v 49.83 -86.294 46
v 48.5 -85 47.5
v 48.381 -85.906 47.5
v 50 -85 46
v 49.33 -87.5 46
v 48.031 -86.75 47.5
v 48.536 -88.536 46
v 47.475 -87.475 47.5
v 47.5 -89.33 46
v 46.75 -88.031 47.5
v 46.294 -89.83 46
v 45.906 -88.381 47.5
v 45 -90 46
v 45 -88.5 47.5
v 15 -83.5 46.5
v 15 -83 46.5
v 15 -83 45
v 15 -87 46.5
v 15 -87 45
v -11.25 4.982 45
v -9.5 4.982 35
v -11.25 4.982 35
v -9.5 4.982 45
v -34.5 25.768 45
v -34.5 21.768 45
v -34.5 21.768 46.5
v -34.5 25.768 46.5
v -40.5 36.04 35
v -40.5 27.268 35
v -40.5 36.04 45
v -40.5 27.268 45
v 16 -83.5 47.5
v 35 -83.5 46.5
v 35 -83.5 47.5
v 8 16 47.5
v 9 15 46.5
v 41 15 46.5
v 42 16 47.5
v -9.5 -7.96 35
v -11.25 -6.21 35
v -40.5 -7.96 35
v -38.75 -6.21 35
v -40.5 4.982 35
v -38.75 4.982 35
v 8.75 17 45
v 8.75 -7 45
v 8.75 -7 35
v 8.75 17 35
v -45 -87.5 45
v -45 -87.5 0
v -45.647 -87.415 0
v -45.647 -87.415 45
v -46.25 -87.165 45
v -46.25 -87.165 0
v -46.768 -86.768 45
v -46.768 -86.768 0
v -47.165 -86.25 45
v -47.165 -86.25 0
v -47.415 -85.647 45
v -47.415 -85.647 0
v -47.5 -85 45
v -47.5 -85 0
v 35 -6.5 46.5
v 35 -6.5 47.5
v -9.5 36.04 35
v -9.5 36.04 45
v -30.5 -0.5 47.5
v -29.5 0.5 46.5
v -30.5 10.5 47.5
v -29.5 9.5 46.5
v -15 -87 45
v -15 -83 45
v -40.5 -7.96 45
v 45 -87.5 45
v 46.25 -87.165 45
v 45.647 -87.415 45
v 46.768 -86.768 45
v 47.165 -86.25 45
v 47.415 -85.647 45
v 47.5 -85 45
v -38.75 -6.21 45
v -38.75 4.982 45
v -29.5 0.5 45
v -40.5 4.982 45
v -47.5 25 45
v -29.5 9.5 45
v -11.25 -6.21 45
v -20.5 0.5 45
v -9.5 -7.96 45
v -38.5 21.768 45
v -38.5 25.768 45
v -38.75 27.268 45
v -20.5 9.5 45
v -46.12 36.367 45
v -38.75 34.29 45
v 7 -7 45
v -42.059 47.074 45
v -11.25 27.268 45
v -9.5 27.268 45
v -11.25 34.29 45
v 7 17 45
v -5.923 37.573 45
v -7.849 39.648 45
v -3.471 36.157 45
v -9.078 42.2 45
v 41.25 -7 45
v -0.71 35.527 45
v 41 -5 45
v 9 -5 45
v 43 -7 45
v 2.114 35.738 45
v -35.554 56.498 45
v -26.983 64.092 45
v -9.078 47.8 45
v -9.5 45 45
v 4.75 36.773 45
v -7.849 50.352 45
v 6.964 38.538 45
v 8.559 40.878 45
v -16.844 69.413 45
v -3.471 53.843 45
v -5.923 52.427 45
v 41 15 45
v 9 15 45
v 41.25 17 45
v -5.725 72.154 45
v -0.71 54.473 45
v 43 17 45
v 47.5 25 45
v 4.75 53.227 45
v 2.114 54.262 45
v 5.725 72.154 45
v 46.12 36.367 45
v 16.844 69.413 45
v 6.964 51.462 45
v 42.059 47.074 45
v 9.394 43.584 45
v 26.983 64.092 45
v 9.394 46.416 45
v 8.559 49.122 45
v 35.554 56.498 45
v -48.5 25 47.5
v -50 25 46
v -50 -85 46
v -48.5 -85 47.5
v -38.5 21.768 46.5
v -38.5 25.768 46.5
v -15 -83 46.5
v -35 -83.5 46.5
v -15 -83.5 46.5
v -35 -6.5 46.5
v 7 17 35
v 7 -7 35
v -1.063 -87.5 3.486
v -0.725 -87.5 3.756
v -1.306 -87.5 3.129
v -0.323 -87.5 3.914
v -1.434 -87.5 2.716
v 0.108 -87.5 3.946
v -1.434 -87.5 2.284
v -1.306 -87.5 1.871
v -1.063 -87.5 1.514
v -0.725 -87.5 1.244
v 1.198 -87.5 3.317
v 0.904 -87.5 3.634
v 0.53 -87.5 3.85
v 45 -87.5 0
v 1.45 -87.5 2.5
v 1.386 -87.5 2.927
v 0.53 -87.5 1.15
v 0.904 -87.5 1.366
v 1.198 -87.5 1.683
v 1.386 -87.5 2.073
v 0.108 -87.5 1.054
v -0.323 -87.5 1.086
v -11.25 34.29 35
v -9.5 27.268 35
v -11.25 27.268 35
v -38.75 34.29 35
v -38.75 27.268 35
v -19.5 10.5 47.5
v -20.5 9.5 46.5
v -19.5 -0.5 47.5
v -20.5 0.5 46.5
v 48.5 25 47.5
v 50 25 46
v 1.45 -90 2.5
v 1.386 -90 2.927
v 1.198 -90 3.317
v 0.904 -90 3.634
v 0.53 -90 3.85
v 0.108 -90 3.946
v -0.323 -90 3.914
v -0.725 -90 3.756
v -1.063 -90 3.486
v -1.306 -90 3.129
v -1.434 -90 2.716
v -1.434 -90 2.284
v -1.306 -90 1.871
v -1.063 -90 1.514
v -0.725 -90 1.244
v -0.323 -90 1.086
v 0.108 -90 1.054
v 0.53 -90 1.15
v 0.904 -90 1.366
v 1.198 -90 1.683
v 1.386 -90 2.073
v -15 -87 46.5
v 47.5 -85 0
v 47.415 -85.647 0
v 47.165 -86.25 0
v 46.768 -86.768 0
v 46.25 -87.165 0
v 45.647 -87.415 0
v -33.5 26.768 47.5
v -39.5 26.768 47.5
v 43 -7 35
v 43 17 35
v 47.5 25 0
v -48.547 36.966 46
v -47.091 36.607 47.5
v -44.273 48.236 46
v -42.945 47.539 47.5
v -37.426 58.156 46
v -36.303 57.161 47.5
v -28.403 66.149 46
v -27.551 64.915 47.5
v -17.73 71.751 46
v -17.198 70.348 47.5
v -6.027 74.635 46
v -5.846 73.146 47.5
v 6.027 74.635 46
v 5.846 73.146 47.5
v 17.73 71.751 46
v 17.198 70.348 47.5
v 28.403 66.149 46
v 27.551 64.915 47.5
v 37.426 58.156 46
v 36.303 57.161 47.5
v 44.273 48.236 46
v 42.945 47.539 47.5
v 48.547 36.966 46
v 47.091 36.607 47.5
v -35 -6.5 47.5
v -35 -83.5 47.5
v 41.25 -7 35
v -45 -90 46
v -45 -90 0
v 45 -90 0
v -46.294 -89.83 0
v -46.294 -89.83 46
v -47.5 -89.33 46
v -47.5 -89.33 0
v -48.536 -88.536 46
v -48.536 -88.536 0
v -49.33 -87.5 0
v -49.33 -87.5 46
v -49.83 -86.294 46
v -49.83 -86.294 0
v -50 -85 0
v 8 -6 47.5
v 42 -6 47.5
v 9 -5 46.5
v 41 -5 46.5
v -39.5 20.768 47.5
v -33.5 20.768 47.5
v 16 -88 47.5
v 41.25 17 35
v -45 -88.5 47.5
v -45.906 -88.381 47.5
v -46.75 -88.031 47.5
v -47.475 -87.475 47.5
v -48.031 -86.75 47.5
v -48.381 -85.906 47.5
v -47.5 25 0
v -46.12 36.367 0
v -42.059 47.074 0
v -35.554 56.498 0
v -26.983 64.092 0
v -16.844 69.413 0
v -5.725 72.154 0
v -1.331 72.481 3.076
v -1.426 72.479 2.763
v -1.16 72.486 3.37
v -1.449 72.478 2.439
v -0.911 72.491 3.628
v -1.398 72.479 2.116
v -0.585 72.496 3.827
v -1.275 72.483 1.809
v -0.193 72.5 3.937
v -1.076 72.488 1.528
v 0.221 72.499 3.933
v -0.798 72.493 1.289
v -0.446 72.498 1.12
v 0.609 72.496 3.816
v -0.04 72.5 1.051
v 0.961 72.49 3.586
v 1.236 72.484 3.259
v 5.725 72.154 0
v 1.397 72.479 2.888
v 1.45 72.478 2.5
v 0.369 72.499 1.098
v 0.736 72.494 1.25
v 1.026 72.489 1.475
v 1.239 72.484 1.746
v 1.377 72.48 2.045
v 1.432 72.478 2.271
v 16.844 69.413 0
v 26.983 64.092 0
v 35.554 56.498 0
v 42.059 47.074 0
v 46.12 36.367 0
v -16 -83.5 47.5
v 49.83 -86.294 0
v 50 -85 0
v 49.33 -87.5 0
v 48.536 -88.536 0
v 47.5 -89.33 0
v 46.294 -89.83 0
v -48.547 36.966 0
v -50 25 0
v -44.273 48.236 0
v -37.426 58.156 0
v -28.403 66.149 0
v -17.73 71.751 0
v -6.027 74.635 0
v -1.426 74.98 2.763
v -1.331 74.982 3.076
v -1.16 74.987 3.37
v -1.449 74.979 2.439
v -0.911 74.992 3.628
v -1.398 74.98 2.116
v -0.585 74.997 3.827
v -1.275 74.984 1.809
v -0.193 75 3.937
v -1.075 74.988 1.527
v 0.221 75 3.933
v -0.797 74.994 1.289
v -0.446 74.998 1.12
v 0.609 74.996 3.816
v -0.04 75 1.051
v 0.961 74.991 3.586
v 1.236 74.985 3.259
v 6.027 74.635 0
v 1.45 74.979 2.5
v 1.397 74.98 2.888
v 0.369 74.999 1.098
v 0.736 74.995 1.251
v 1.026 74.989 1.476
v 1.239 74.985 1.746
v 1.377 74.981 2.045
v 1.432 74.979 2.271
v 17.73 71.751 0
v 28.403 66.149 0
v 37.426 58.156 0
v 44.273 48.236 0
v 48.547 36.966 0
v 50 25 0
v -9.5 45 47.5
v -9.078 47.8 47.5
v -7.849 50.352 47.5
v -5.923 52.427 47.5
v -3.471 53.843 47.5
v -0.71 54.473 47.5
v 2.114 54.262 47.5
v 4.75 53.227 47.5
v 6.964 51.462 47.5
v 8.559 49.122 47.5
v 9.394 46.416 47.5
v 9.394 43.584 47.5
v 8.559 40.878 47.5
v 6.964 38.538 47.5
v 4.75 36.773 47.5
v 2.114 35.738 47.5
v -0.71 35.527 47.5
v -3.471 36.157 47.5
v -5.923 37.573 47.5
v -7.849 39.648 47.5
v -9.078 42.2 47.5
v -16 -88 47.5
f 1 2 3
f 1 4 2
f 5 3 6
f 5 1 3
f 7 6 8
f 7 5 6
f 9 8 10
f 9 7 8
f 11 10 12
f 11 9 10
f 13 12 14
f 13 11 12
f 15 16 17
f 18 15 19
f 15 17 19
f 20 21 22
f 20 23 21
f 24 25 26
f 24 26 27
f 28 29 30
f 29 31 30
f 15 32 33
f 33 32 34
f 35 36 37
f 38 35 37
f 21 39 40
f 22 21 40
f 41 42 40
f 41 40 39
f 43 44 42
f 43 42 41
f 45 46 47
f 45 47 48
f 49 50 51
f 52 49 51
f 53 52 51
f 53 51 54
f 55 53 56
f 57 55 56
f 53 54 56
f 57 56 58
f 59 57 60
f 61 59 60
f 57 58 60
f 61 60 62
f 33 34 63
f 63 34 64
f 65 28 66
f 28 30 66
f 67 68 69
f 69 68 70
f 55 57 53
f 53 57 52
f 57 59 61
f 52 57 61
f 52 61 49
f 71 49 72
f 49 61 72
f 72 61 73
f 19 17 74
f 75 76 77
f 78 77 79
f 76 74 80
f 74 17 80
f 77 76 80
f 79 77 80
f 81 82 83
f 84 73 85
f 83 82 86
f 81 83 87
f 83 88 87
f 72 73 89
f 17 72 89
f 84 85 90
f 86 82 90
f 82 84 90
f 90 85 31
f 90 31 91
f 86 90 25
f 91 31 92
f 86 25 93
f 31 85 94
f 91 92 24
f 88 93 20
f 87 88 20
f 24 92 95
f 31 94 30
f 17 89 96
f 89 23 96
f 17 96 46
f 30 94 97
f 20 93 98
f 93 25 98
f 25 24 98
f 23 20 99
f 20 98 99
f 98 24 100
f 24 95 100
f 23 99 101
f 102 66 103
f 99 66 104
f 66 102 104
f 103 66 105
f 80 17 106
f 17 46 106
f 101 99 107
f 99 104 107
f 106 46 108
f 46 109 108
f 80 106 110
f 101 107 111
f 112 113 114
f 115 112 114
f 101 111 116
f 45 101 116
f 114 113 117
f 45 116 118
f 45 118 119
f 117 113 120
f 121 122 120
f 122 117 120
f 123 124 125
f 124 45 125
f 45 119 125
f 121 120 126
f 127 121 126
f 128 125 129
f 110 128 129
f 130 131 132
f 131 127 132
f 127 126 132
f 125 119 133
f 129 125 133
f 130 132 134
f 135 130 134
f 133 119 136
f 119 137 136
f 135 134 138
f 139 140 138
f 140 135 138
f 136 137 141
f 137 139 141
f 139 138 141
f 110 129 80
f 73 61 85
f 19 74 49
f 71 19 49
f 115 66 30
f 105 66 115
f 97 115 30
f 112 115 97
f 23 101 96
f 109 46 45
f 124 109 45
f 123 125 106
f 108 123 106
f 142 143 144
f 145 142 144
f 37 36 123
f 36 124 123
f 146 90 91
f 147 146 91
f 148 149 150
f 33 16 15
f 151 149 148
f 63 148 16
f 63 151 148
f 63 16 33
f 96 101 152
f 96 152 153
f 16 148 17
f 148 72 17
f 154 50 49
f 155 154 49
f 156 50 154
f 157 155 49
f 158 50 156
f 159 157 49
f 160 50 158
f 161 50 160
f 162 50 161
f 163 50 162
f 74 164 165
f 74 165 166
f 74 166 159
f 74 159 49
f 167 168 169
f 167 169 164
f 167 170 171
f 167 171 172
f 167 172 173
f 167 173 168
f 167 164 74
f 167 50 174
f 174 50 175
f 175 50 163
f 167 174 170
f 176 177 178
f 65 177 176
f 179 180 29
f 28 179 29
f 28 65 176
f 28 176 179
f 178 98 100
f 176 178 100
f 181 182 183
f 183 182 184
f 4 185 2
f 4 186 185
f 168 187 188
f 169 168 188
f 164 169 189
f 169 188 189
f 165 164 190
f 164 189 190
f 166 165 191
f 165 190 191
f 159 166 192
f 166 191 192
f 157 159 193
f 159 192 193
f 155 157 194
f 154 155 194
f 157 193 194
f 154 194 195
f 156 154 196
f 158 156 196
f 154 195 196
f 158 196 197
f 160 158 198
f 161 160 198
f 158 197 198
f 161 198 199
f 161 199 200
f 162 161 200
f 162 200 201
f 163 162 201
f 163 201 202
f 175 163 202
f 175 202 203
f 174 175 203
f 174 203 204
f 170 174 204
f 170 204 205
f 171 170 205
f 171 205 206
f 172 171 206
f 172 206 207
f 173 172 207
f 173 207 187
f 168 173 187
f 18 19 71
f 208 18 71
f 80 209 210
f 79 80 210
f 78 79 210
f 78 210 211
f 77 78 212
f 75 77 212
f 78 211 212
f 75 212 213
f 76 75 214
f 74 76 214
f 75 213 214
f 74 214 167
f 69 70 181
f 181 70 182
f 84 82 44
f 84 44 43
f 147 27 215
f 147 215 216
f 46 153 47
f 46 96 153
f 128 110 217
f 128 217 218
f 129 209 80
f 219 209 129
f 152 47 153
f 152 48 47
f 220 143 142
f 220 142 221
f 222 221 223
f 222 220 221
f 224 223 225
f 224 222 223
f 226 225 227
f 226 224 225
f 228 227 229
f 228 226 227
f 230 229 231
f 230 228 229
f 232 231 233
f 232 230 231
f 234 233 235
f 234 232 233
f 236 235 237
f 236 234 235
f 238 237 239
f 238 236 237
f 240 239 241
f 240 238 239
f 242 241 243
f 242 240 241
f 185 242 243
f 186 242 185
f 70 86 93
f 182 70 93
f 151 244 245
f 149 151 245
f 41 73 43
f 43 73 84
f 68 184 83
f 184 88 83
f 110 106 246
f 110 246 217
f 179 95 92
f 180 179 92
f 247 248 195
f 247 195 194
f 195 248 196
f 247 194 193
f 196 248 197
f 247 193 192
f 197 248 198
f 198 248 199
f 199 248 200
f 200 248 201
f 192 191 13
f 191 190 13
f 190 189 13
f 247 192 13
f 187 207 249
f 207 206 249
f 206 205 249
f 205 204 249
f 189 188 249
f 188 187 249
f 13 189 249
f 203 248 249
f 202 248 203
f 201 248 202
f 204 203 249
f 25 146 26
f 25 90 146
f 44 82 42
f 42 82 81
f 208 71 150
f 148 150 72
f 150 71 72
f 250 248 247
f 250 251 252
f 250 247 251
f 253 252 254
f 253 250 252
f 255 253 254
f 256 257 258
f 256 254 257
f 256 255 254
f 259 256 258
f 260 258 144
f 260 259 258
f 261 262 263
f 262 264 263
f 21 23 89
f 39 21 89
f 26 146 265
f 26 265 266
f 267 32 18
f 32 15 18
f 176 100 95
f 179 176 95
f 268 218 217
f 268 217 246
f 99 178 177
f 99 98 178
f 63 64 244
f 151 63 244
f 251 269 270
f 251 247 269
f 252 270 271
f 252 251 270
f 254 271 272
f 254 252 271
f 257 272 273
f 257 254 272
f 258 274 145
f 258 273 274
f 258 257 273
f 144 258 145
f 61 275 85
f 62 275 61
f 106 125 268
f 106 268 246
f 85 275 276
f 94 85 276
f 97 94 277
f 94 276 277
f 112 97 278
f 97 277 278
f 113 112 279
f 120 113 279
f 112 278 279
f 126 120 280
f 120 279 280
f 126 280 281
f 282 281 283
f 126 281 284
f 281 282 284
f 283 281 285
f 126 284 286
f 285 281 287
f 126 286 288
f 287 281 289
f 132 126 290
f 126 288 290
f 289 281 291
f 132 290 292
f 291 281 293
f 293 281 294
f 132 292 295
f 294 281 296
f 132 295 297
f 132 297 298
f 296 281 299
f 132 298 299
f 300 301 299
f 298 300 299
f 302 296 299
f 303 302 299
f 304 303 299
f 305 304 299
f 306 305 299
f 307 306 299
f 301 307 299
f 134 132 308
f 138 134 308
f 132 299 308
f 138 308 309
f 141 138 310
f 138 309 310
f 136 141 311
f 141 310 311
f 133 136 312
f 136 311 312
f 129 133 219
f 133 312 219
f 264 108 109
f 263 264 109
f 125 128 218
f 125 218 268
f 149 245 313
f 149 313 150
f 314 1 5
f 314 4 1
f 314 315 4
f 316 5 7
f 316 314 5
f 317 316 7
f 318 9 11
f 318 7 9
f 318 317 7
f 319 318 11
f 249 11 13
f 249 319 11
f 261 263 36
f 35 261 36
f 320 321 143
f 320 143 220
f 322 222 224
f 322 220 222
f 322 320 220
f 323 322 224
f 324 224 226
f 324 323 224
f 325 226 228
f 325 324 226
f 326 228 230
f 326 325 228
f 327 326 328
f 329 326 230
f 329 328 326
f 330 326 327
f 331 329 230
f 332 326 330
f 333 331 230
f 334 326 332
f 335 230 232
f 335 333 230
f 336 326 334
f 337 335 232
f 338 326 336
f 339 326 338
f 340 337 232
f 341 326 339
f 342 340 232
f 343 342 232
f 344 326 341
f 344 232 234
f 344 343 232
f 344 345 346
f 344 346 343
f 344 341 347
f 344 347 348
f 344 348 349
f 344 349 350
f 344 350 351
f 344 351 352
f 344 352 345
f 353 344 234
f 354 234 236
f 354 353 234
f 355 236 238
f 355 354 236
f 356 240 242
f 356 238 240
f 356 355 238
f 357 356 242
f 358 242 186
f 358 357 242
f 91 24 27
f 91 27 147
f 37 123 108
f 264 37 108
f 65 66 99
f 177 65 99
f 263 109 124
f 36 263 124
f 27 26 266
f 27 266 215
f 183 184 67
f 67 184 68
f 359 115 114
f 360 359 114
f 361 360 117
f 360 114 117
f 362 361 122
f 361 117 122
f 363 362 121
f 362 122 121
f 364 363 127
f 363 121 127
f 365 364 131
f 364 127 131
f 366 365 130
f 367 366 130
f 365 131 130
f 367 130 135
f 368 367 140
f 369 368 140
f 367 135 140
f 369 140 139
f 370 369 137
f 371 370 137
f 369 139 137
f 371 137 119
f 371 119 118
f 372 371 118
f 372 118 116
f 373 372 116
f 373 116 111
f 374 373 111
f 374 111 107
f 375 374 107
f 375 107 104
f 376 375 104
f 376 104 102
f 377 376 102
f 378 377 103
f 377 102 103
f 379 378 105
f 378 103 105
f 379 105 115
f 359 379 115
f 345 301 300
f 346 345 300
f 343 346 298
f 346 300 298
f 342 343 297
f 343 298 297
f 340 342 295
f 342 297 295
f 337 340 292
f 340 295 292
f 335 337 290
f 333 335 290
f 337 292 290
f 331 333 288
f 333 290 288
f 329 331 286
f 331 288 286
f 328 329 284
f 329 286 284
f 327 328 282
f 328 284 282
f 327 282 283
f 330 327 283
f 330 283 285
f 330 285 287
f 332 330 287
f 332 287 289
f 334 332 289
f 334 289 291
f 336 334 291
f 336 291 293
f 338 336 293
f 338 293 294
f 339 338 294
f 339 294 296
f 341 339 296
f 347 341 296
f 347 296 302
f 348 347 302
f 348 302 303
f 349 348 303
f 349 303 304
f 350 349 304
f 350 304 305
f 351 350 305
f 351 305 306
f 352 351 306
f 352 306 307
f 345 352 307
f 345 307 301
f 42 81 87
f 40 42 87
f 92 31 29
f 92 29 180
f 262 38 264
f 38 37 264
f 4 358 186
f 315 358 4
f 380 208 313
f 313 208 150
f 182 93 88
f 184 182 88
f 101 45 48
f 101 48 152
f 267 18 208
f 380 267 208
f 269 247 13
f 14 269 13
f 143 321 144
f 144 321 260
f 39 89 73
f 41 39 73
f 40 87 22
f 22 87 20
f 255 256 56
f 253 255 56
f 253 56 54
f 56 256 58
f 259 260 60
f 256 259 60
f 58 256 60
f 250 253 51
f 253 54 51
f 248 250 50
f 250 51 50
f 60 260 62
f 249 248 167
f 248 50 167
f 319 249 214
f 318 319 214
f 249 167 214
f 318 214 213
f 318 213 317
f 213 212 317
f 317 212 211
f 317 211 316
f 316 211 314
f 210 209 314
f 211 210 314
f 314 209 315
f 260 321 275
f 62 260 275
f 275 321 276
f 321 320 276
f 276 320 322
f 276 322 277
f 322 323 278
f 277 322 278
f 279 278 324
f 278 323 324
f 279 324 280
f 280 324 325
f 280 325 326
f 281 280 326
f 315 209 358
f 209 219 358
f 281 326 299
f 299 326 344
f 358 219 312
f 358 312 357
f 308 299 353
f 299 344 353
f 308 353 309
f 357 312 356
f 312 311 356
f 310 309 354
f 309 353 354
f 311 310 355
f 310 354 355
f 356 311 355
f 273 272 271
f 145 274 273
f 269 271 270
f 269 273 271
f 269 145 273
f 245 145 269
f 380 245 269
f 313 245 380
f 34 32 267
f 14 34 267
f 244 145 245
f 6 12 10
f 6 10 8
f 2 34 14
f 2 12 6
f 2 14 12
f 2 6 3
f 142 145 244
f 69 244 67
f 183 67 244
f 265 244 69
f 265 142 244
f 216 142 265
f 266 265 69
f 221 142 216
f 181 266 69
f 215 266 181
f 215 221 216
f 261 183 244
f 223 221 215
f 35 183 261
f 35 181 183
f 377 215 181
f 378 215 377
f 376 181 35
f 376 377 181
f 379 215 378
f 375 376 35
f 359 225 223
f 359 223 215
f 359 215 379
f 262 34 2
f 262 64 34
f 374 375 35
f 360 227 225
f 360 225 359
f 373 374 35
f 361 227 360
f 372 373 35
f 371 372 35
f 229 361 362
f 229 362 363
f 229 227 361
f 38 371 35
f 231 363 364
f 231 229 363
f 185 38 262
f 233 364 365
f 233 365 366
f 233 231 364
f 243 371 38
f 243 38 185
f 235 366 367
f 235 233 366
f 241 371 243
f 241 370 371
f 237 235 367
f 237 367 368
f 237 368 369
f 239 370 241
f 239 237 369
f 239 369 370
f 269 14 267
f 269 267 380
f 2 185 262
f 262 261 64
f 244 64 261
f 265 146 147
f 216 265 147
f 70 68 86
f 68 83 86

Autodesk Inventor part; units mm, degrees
ref_plane "YZ Plane" through (0, 0, 0) normal (1, 0, 0) x (0, 1, 0)
ref_plane "XZ Plane" through (0, 0, 0) normal (0, 1, 0) x (-1, 0, 0)
ref_plane "XY Plane" through (0, 0, 0) normal (0, 0, 1) x (1, 0, 0)
sketch "Sketch1" plane through (0, 0, 0) normal (0, 0, 1) x (1, 0, 0)
  line L0 (50, -70) -> (50, 25)
  line L1 (-50, 25) -> (-50, -70)
  line L2 (0, 0) -> (-38.1854, 57.2781) construction
  arc A0 (50, 25) -> (-50, 25) centre (0, 25) ccw
  line L3 (-45, -90) -> (45, -90)
  line L4 (0, 0) -> (38.1854, 57.2781) construction
  line L5 (50, -70) -> (50, -85)
  line L6 (-50, -70) -> (-50, -85)
  arc A1 (45, -90) -> (50, -85) centre (45, -85) ccw
  arc A2 (-50, -85) -> (-45, -90) centre (-45, -85) ccw
  dimension "d19" = 5
extrude "Extrusion1" add sketch "Sketch1" along normal blind 47.5
shell "Shell1" thickness 2.5 removed faces 1 at (-16.6667, -6.6667, 0)
sketch "Sketch2" plane through (0, 25, 45) normal (0, 0, -1) x (-1, 0, 0)
  arc A0 (50, 0) -> (-50, 0) centre (0, 0) ccw projected
  line L0 (25, 0) -> (50, 0) construction
  line L1 (25, 0) -> (50, 0) construction
  line L2 (-25, 0) -> (-50, 0)
  line L3 (-47.5, -110) -> (-47.5, 0) projected
  line L4 (25, 0) -> (50, 0) construction
  line L5 (25, 0) -> (50, 0) construction
  line L6 (47.5, 0) -> (47.5, -112.5)
  line L7 (47.5, -112.5) -> (-47.5, -112.5)
  line L8 (-47.5, -112.5) -> (-47.5, 0)
  line L9 (20.5, -24.5) -> (29.5, -24.5)
  line L10 (29.5, -24.5) -> (29.5, -15.5)
  line L11 (29.5, -15.5) -> (20.5, -15.5)
  line L12 (20.5, -15.5) -> (20.5, -24.5)
  circle A1 centre (25, -20) radius 0.7
  line L13 (20.5, -24.5) -> (29.5, -15.5) construction
  line L14 (29.5, -24.5) -> (20.5, -15.5) construction
  circle A2 centre (36.5, -1.2321) radius 0.9
  line L15 (34.5, 0.7679) -> (38.5, 0.7679)
  line L16 (38.5, -3.2321) -> (34.5, -3.2321)
  line L17 (34.5, 0.7679) -> (38.5, -3.2321) construction
  line L18 (38.5, 0.7679) -> (34.5, -3.2321) construction
  line L19 (34.5, -3.2321) -> (34.5, 0.7679)
  line L20 (29.5, -15.5) -> (29.5, -24.5)
  circle A3 centre (25, -20) radius 0.7
  line L21 (20.5, -15.5) -> (29.5, -15.5)
  line L22 (29.5, -24.5) -> (20.5, -24.5)
  line L23 (20.5, -24.5) -> (20.5, -15.5)
  line L24 (20.5, -15.5) -> (29.5, -24.5) construction
  line L25 (29.5, -15.5) -> (20.5, -24.5) construction
  line L26 (11.5, -30.9599) -> (38.5, -30.9599)
  line L27 (38.5, 9.0401) -> (11.5, 9.0401)
  line L28 (11.5, 9.0401) -> (11.5, -30.9599)
  line L29 (38.5, -30.9599) -> (38.5, 9.0401)
  line L30 (38.5, 0.7679) -> (38.5, -3.2321)
  line L31 (25, -20) -> (25, 0)
  line L32 (-25, 0) -> (-25, -20)
  line L33 (-25, 0) -> (-5, 0) construction
  line L34 (-41, -30) -> (-9, -30)
  line L35 (-9, -30) -> (-9, -10)
  line L36 (-9, -10) -> (-41, -10)
  line L37 (-41, -10) -> (-41, -30)
  line L38 (-41, -30) -> (-9, -10) construction
  line L39 (-9, -30) -> (-41, -10) construction
  line L40 (0, 0) -> (0, 20)
  circle A4 centre (0, 20) radius 9.5
  line L41 (33.5, -108) -> (-35.5, -108)
  line L42 (-35.5, -108) -> (-35.5, -32)
  line L43 (-35.5, -32) -> (33.5, -32)
  line L44 (33.5, -32) -> (33.5, -108)
  line L45 (33.5, -108) -> (-35.5, -32) construction
  line L46 (-35.5, -108) -> (33.5, -32) construction
  line L47 (-15, -112) -> (15, -112)
  line L48 (15, -112) -> (15, -108)
  line L49 (15, -108) -> (-15, -108)
  line L50 (-15, -108) -> (-15, -112)
  line L51 (-15, -112) -> (15, -108) construction
  line L52 (15, -112) -> (-15, -108) construction
  point P0 (0, -25)
  point P1 (-47.5, -95)
  point P2 (25, -20)
  point P3 (-1, -70)
  point P4 (0, -110)
  dimension "d26" = 20
  dimension "d27" = 90
  dimension "d28" = 32
  dimension "d29" = 20
  dimension "d30" = 20
  dimension "d31" = 19
  dimension "d32" = 69
  dimension "d33" = 76
extrude "Extrusion2" cut sketch "Sketch2" against normal blind 50 contours A1 | L12 L11 L10 L9 | A2 | L15 L29 L16 L19 | L37 L36 L35 L34 | A4 | L48 L47 L50 L41
sketch "Sketch3" plane through (0, 25, 45) normal (0, 0, -1) x (-1, 0, 0)
  line L0 (29.5, -24.5) -> (29.5, -15.5)
  circle A0 centre (25, -20) radius 0.7
  line L1 (20.5, -24.5) -> (29.5, -24.5)
  line L2 (29.5, -15.5) -> (20.5, -15.5)
  line L3 (20.5, -15.5) -> (20.5, -24.5)
  line L4 (20.5, -24.5) -> (29.5, -15.5) construction
  line L5 (29.5, -24.5) -> (20.5, -15.5) construction
  circle A1 centre (36.5, -1.2321) radius 0.9
  line L6 (34.5, 0.7679) -> (38.5, -3.2321) construction
  circle A2 centre (25, -20) radius 0.7
  line L7 (20.5, -15.5) -> (29.5, -15.5)
  line L8 (29.5, -15.5) -> (29.5, -24.5)
  line L9 (29.5, -24.5) -> (20.5, -24.5)
  line L10 (20.5, -24.5) -> (20.5, -15.5)
  line L11 (20.5, -15.5) -> (29.5, -24.5) construction
  line L12 (29.5, -15.5) -> (20.5, -24.5) construction
  line L13 (38.5, -3.2321) -> (34.5, -3.2321)
  line L14 (34.5, -3.2321) -> (34.5, 0.7679)
  line L15 (38.5, 0.7679) -> (38.5, -3.2321)
  line L16 (38.5, 0.7679) -> (34.5, -3.2321) construction
  line L17 (34.5, 0.7679) -> (38.5, 0.7679)
  line L18 (11.5, -30.9599) -> (38.5, -30.9599)
  line L19 (11.5, 9.0401) -> (11.5, -30.9599)
  line L20 (38.5, -30.9599) -> (38.5, 9.0401)
  line L21 (38.5, 9.0401) -> (11.5, 9.0401)
  line L22 (25, -20) -> (25, 0)
  line L23 (-25, 0) -> (-25, -20)
  line L24 (-25, 0) -> (-5, 0) construction
  line L25 (-41, -30) -> (-9, -30)
  line L26 (-9, -30) -> (-9, -10)
  line L27 (-9, -10) -> (-41, -10)
  line L28 (-41, -10) -> (-41, -30)
  line L29 (-41, -30) -> (-9, -10) construction
  line L30 (-9, -30) -> (-41, -10) construction
  line L31 (0, 0) -> (0, 20)
  line L32 (9.5, -32.9599) -> (40.5, -32.9599)
  line L33 (40.5, -32.9599) -> (40.5, 11.0401)
  line L34 (40.5, 11.0401) -> (9.5, 11.0401)
  line L35 (9.5, 11.0401) -> (9.5, -32.9599)
  line L36 (-7, -8) -> (-7, -32)
  line L37 (-43, -32) -> (-43, -8)
  line L38 (-41, -30) -> (-41, -32)
  line L39 (11.25, 9.2901) -> (38.75, 9.2901)
  line L40 (38.75, 9.2901) -> (38.75, -31.2099)
  line L41 (38.75, -31.2099) -> (11.25, -31.2099)
  line L42 (11.25, -31.2099) -> (11.25, 9.2901)
  line L43 (-25, -9.75) -> (-8.75, -9.75)
  line L44 (-8.75, -9.75) -> (-8.75, -30.25)
  line L45 (-8.75, -30.25) -> (-41.25, -30.25)
  line L46 (-41.25, -30.25) -> (-41.25, -9.75)
  line L47 (-41.25, -9.75) -> (-41.25, -8)
  line L48 (-41.25, -30.25) -> (-41.25, -32)
  line L49 (-8.75, -30.25) -> (-8.75, -32)
  line L50 (-8.75, -9.75) -> (-8.75, -8)
  line L51 (-43, -8) -> (-41.25, -8)
  line L52 (-8.75, -8) -> (-7, -8)
  line L53 (-7, -32) -> (-8.75, -32)
  line L54 (-41, -32) -> (-43, -32)
  line L55 (6, -20.0179) -> (44, -20.0179)
  line L56 (44, -20.0179) -> (44, 2.2679)
  line L57 (44, 2.2679) -> (6, 2.2679)
  line L58 (6, 2.2679) -> (6, -20.0179)
  line L59 (6, -20.0179) -> (44, 2.2679) construction
  line L60 (44, -20.0179) -> (6, 2.2679) construction
  point P0 (0, -25)
  point P1 (25, -20)
  point P2 (25, -8.875)
  point P3 (40.5, -20.0179)
  point P4 (38.75, -20.0179)
  point P5 (11.25, -20.0179)
  point P6 (9.5, -20.0179)
  point P7 (9.5, 2.2679)
  point P8 (11.25, 2.2679)
  point P9 (38.75, 2.2679)
  point P10 (40.5, 2.2679)
  dimension "d36" = 20
  dimension "d37" = 90
  dimension "d39" = 20
  dimension "d40" = 20
  dimension "d41" = 2
  dimension "d42" = 0.25
  dimension "d44" = 0.25
extrude "Extrusion3" add sketch "Sketch3" along normal blind 10 contours L55 L33 L32 L35 L42 L41 L40 | L40 L39 L42 L57 L35 L34 L33 | L50 L52 L36 L53 L49 L44 | L48 L54 L37 L51 L47 L46
chamfer "Chamfer1" distance 1 angle 45 12 edges at (25, 15, 47.5) (41, 5, 47.5) (25, -5, 47.5) (9, 5, 47.5) (-25, 9.5, 47.5) (-20.5, 5, 47.5) (-29.5, 5, 47.5) (-25, 0.5, 47.5) (-36.5, 21.7679, 47.5) (-34.5, 23.7679, 47.5) (-36.5, 25.7679, 47.5) (-38.5, 23.7679, 47.5)
chamfer "Chamfer2" distance 1 angle 45 4 edges at (0, -83, 47.5) (0, -87, 47.5) (-15, -85, 47.5) (15, -85, 47.5)
sketch "Sketch4" plane through (0, 0, 47.5) normal (0, 0, 1) x (1, 0, 0)
  line L0 (15, -83) -> (-15, -83) projected
  line L1 (0, -83) -> (0, -45)
  line L2 (-35, -83.5) -> (35, -83.5)
  line L3 (35, -83.5) -> (35, -6.5)
  line L4 (35, -6.5) -> (-35, -6.5)
  line L5 (-35, -6.5) -> (-35, -83.5)
  line L6 (-35, -83.5) -> (35, -6.5) construction
  line L7 (35, -83.5) -> (-35, -6.5) construction
  point P0 (0, 0)
  dimension "d53" = 38
  dimension "d54" = 70
  dimension "d55" = 77
extrude "Extrusion4" cut sketch "Sketch4" against normal blind 1
chamfer "Chamfer3" distance 1.5 angle 45 6 edges at (0, 75, 47.5) (-50, -30, 47.5) (-48.5355, -88.5355, 47.5) (0, -90, 47.5) (48.5355, -88.5355, 47.5) (50, -30, 47.5)
sketch "Sketch5" plane through (-45, -90, 0) normal (0, -1, 0) x (1, 0, 0)
  line L0 (45, 0) -> (45, 5)
  circle A0 centre (45, 2.5) radius 1.45
  dimension "d61" = 5
  dimension "d62" = 2.9
extrude "Extrusion5" cut sketch "Sketch5" against normal through all
properties part number "enclouser"
